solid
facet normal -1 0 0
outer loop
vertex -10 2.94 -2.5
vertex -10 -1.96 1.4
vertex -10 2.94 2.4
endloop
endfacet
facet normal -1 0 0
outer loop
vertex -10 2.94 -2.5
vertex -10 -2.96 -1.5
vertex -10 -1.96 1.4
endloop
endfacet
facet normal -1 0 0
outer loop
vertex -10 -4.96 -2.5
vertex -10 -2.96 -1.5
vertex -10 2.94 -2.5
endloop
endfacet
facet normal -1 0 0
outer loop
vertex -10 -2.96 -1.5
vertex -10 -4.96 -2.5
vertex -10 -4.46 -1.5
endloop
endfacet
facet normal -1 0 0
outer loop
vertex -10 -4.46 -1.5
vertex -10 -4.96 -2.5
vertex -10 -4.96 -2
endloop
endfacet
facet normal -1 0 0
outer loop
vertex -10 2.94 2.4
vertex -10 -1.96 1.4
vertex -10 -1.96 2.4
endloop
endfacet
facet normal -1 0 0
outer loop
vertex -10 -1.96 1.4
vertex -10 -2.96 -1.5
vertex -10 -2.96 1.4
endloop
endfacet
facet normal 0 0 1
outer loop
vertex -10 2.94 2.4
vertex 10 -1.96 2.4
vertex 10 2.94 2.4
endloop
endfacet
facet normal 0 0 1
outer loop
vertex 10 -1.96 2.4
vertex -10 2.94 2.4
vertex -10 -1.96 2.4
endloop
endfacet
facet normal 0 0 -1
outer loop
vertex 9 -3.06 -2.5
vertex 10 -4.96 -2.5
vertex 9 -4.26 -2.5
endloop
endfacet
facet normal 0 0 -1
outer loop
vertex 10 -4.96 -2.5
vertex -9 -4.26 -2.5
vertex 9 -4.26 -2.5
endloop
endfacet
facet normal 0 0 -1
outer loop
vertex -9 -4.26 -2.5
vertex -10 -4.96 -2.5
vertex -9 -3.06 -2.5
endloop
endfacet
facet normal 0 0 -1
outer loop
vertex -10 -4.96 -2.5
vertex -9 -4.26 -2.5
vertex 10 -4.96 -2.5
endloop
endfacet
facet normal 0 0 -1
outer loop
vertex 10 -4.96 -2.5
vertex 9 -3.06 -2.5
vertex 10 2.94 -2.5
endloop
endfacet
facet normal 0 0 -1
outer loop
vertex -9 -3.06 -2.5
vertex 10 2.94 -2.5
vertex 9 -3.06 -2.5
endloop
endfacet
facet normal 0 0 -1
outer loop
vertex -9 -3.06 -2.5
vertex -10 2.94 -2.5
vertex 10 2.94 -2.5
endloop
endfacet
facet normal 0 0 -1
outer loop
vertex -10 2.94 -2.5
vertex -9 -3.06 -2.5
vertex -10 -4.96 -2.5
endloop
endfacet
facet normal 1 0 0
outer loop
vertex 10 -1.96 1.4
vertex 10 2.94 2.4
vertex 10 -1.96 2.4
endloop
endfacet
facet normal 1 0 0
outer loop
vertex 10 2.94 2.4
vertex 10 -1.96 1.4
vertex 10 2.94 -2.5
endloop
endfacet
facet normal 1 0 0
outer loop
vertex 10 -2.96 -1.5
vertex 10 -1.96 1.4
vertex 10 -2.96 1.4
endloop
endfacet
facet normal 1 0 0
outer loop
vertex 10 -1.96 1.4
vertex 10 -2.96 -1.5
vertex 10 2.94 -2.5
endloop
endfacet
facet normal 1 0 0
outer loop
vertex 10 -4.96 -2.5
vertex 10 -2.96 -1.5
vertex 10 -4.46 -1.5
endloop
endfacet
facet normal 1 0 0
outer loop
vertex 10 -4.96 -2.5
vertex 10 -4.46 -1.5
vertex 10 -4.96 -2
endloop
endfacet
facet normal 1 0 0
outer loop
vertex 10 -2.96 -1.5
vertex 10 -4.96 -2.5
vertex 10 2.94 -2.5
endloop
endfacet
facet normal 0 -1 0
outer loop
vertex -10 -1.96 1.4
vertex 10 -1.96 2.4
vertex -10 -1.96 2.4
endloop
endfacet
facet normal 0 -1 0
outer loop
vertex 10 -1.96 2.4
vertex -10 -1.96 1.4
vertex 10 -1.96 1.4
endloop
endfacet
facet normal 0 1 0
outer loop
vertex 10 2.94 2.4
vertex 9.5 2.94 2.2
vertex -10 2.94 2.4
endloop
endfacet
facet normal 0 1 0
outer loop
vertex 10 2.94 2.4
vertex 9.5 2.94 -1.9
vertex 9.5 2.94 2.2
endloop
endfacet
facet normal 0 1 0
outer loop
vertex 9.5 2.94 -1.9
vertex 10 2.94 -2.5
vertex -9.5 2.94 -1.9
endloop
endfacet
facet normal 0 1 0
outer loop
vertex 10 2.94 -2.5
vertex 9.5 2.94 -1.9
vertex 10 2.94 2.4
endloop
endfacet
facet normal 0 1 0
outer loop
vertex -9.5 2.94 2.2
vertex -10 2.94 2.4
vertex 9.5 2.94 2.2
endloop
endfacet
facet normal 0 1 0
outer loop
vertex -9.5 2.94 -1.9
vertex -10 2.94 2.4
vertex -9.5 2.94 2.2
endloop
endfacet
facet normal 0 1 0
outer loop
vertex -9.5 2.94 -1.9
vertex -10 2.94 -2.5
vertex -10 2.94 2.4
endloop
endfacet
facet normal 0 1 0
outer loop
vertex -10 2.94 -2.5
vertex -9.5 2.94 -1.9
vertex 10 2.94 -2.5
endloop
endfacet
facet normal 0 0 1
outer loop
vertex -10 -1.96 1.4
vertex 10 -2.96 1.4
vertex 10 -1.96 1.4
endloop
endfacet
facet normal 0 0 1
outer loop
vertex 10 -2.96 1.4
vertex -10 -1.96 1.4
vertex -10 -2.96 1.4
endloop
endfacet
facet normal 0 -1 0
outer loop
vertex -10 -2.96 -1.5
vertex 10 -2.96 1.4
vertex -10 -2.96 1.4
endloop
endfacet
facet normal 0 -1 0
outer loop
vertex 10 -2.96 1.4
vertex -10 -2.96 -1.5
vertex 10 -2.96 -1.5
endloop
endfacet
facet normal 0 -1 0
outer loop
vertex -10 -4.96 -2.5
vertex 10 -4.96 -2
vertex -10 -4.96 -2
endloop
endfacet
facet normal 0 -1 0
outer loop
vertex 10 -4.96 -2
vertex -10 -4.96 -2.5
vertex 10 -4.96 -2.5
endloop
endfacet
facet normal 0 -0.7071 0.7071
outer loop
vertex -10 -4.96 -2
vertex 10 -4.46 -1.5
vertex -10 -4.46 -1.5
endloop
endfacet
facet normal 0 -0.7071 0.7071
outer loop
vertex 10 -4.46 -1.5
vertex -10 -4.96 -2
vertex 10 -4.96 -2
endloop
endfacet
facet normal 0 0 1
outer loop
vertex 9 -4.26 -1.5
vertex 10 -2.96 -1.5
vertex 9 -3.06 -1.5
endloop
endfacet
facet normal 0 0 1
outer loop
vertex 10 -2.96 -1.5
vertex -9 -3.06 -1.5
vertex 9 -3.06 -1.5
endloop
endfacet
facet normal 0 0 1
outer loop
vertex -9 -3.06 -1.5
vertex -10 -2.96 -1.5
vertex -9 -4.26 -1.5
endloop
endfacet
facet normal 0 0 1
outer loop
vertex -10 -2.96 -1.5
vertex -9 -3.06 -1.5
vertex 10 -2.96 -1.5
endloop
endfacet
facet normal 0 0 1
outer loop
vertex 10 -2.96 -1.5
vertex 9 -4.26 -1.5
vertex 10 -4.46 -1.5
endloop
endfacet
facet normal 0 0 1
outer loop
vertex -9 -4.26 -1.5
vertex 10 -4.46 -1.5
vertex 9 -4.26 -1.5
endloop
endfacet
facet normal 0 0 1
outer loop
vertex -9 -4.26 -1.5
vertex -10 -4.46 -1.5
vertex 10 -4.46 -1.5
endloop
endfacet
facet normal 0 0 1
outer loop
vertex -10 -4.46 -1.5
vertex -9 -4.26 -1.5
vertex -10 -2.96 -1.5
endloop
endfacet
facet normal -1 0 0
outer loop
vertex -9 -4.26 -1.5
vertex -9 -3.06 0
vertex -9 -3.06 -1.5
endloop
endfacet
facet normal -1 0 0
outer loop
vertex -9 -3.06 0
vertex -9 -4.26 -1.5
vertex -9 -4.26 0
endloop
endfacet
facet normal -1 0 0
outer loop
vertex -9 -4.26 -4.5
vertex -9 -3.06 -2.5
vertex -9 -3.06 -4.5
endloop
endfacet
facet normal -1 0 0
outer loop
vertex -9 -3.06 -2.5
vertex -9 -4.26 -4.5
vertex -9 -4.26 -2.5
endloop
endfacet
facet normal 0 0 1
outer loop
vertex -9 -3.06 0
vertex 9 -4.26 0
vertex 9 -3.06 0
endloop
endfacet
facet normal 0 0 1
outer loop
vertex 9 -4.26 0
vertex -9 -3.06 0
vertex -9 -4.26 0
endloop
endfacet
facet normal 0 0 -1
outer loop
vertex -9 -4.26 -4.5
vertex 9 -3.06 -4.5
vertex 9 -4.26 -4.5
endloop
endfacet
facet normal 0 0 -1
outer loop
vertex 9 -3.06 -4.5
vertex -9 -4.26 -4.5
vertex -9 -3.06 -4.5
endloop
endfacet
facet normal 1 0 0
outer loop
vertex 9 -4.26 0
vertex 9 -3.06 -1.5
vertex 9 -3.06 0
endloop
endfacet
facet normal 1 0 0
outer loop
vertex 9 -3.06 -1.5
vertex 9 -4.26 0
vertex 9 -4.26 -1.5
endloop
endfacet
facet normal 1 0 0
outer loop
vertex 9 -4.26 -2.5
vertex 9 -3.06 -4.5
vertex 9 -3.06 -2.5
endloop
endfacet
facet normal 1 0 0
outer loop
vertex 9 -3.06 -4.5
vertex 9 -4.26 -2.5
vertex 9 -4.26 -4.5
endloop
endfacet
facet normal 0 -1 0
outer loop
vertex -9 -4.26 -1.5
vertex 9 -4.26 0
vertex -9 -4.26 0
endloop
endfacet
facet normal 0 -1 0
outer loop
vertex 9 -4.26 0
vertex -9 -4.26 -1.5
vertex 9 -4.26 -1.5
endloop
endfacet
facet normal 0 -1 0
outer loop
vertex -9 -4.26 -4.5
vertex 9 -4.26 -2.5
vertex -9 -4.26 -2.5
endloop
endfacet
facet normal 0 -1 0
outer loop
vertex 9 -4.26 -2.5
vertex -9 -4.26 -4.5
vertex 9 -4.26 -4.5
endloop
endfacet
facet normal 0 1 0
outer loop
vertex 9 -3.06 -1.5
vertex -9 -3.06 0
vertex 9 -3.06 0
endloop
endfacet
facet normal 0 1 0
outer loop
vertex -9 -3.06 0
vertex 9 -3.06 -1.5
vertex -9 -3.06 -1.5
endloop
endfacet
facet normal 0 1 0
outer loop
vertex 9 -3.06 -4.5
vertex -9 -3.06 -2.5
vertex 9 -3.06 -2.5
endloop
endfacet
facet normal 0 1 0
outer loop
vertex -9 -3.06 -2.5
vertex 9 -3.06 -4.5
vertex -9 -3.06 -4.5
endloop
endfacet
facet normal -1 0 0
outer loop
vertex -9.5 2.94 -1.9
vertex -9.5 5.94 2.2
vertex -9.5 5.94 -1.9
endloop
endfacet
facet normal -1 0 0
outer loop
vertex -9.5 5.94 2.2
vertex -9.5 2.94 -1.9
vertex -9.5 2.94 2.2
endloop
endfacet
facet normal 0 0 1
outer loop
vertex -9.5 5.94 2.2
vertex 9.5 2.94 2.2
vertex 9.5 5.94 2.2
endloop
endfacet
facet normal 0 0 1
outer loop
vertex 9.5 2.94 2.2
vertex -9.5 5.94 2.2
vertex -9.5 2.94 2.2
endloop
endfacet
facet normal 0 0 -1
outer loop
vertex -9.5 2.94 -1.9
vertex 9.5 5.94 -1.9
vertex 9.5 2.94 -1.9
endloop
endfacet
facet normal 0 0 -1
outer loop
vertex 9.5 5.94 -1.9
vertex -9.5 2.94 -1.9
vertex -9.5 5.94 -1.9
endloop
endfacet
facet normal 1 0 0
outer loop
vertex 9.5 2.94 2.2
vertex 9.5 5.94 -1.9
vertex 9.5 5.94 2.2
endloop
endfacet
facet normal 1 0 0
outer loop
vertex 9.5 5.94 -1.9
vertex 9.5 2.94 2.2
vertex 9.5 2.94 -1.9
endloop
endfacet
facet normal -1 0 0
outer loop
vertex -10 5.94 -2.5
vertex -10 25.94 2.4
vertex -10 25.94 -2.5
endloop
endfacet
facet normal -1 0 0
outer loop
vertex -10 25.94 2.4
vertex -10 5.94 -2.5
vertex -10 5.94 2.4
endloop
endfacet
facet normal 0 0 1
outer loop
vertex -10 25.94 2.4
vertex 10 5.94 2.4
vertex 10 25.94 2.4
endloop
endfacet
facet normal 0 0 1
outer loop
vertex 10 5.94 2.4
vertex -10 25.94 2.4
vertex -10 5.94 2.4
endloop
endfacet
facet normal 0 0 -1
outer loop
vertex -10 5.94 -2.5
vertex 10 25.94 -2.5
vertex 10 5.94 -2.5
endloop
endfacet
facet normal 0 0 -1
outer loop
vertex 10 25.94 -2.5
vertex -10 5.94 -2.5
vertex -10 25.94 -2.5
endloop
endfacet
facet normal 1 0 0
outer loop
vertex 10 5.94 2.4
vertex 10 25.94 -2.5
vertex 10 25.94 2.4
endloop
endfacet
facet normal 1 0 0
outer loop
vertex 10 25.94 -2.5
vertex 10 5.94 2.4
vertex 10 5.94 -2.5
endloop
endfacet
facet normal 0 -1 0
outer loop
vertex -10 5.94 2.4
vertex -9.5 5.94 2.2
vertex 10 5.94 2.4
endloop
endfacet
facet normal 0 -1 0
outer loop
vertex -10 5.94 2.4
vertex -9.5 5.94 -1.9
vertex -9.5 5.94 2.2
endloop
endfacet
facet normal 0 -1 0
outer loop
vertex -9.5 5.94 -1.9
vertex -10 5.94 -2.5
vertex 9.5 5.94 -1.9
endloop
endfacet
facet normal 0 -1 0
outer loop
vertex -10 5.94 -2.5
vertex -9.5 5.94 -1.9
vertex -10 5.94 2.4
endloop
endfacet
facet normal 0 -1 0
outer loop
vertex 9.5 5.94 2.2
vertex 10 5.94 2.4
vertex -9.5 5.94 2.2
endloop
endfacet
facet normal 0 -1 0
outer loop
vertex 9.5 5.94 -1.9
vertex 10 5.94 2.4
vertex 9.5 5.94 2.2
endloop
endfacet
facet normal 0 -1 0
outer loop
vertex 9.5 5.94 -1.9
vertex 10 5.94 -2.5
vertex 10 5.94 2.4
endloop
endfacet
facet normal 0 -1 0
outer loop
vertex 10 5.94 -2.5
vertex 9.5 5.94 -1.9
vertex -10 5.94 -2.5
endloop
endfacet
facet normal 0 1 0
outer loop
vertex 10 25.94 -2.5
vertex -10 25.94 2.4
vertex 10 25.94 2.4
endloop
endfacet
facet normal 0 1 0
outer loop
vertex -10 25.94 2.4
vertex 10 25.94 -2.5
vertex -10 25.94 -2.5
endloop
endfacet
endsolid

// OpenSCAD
N=7;
A=2.5+N*2.5;
rotate([0,0,180])
translate([-A/2,-2.94,-2.5])
{
	cube([A,4.9,4.9]);
	cube([A,5.9,3.9]);
	hull()
	{
		cube([A,7.4,1]);
		cube([A,7.9,0.5]);
	}
	translate([1,6,-2])cube([A-2,1.2,4.5]); // Assumes cropped pins
	// Plug
	translate([0.5,-20,0.6])cube([A-1,21,4.1]);
	translate([0,-23,0])cube([A,20,4.9]);
}
